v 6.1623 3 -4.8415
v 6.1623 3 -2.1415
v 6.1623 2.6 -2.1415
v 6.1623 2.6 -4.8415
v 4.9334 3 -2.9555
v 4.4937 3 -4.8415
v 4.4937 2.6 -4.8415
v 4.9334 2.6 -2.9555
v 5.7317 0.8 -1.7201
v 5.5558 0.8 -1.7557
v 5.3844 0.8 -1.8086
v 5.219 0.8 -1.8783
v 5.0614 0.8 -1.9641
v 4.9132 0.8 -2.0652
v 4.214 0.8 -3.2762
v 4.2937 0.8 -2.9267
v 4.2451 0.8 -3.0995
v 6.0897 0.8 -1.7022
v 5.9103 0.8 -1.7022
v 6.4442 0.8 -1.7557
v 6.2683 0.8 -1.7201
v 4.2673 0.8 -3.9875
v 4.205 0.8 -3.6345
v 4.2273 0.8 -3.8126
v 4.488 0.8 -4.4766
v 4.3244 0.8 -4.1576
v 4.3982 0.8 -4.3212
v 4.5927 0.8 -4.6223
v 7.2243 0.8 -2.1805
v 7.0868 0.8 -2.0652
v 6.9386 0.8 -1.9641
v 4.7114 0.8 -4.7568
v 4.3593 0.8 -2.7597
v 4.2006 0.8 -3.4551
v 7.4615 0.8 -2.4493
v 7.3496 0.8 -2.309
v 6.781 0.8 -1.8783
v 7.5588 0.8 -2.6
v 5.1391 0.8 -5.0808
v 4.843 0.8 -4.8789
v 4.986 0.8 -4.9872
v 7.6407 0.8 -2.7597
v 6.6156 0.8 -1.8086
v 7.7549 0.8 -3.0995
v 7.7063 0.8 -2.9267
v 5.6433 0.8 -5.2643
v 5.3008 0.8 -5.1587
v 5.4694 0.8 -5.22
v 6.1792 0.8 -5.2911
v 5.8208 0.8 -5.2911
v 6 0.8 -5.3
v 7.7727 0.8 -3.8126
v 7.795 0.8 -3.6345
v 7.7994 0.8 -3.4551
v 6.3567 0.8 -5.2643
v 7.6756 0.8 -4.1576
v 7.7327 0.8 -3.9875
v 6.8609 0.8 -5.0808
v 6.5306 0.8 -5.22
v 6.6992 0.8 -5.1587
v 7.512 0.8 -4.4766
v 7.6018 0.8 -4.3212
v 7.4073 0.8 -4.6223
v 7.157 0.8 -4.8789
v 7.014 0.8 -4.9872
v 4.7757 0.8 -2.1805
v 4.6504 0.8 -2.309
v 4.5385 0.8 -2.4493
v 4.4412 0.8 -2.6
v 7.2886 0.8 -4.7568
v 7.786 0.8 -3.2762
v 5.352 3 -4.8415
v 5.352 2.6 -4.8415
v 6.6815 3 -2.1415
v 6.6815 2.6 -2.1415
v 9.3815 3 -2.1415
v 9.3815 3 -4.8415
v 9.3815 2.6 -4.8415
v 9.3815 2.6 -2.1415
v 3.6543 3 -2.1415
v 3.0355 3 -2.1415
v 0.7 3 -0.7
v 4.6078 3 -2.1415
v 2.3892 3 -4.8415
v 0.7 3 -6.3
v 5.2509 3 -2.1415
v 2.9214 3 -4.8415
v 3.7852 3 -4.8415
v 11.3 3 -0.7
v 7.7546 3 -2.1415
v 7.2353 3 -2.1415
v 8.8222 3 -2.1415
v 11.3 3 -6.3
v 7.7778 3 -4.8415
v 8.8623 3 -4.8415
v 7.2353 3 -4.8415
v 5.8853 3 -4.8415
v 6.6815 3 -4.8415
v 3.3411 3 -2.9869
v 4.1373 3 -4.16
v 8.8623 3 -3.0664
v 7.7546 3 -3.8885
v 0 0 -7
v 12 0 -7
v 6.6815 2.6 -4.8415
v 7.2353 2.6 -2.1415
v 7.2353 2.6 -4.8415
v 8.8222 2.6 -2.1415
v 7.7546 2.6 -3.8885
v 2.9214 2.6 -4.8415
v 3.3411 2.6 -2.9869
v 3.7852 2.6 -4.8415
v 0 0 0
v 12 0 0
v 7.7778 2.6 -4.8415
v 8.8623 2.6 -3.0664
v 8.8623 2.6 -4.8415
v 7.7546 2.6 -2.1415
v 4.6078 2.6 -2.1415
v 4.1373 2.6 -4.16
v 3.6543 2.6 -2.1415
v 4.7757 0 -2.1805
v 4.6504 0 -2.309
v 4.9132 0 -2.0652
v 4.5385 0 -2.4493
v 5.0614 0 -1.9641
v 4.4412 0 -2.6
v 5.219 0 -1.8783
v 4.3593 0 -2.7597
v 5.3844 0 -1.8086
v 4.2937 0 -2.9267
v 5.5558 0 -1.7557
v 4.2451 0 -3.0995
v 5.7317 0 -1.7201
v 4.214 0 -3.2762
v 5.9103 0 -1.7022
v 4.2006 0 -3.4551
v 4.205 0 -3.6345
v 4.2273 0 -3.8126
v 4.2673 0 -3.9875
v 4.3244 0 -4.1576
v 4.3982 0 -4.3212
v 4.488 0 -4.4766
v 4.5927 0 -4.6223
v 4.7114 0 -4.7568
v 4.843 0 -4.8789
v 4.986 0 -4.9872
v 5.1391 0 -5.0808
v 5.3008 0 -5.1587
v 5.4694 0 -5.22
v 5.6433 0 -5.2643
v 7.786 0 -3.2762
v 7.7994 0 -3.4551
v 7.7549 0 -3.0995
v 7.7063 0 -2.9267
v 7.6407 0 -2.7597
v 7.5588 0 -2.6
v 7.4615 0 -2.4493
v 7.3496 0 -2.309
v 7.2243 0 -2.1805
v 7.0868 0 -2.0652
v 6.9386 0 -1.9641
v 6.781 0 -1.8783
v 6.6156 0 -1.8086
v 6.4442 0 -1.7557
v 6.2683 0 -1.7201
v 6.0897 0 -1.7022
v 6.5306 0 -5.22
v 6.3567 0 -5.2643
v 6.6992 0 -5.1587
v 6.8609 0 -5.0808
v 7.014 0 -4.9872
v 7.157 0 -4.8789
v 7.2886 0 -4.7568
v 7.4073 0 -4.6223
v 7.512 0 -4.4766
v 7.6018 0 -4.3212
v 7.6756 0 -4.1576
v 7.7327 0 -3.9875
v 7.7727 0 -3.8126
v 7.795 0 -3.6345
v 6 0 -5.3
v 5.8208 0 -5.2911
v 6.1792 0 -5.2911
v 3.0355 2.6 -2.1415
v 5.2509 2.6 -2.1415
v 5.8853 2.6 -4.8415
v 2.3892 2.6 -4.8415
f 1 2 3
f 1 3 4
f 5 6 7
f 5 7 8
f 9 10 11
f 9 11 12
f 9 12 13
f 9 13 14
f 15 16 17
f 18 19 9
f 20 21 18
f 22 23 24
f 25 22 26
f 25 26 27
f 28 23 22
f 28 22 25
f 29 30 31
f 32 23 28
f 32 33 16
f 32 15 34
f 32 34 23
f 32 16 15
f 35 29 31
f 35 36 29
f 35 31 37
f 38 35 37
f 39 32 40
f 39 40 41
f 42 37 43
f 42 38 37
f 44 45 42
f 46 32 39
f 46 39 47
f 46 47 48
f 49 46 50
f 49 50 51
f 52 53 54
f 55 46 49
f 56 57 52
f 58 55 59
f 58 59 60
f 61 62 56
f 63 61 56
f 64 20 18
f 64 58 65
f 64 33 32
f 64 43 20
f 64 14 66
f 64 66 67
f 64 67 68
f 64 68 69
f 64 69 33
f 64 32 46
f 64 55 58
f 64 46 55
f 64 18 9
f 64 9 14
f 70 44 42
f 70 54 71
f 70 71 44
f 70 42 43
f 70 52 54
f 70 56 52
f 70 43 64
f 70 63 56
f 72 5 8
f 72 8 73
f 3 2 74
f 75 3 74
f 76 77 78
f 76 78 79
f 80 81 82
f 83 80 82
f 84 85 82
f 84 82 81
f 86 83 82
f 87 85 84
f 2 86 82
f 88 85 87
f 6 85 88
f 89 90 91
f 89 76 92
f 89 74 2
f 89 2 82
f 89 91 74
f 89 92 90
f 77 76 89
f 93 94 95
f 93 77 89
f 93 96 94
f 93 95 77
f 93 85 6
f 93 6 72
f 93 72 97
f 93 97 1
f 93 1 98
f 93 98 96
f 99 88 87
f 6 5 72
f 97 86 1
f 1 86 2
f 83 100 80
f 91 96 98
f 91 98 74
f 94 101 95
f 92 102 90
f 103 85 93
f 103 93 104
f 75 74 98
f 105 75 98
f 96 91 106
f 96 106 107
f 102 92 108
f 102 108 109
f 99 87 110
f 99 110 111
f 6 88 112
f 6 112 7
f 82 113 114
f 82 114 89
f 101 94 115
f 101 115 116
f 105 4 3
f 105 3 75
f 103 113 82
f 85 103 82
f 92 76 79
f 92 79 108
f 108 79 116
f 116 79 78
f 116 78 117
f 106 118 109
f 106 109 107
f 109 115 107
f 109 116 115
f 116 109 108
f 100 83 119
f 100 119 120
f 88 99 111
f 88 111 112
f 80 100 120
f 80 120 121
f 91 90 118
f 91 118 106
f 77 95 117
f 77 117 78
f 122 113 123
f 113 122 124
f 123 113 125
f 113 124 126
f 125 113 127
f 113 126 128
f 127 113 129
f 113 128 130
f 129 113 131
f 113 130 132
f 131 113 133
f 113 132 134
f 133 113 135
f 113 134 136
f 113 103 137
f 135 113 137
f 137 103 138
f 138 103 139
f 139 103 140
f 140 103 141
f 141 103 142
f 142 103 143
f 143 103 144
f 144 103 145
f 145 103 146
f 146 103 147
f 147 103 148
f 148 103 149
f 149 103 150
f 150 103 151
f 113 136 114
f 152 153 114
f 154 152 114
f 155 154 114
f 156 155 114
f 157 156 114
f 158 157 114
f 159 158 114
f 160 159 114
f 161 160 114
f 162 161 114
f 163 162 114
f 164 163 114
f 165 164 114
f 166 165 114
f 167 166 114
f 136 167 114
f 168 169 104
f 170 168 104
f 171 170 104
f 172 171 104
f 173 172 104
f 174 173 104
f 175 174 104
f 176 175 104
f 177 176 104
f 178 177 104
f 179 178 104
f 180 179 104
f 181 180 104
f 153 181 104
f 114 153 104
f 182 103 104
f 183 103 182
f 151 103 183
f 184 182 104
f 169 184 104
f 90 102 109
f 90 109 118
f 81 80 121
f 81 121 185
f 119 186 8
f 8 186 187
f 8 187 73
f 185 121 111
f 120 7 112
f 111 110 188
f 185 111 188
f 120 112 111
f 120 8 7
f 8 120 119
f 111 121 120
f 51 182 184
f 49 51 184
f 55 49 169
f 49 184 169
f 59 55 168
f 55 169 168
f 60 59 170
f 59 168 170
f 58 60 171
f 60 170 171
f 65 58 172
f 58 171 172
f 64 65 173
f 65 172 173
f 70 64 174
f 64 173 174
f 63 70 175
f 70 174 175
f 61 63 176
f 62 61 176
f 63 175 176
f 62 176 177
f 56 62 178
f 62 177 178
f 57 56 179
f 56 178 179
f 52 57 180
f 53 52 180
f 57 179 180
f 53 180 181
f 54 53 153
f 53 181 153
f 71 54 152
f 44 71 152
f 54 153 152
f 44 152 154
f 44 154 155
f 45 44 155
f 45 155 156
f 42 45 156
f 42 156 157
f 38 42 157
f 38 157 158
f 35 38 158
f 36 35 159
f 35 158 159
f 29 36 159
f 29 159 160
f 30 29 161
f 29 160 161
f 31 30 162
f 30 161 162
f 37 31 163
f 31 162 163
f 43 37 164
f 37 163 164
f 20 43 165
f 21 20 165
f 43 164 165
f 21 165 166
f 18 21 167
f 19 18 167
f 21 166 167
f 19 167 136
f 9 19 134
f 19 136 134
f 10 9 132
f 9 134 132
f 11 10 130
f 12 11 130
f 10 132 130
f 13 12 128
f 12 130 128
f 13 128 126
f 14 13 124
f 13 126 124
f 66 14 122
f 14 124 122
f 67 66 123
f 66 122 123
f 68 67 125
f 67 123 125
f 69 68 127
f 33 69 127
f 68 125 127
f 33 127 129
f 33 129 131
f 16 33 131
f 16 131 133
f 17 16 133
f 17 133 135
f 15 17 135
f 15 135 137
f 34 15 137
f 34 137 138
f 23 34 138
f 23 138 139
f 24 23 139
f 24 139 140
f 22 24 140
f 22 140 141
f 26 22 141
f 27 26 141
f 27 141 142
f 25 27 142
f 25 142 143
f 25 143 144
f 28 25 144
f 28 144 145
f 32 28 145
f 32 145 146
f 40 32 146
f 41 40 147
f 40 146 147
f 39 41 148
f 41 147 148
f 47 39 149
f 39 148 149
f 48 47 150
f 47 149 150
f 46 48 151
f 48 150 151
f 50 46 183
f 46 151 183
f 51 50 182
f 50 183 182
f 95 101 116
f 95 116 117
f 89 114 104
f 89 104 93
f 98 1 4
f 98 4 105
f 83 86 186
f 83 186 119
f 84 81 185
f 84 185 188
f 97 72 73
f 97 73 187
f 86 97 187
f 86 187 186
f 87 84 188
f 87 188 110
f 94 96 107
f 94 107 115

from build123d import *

# Parameters (mm, degrees)
SKETCH1_W               = 12
SKETCH1_H               = 7
BOSS_EXTRUDE1_DEPTH     = 3
CUT_EXTRUDE1_DEPTH      = 7
CUT_EXTRUDE2_DEPTH      = 15.212670404
CUT_EXTRUDE2_DEPTH_BACK = 15.212670404
SKETCH4_R               = 1.8
CUT_EXTRUDE3_DEPTH      = 0.8
SKETCH5_W               = 0.519230769
SKETCH5_H               = 2.7
CUT_EXTRUDE4_DEPTH      = 0.4


with BuildPart() as part:
    # Sketch1 → Boss-Extrude1 (new body)
    with BuildSketch(Plane(origin=(0, 0, 0), x_dir=(1, 0, 0), z_dir=(0, 1, 0))):
        with Locations((6, 3.5)):
            Rectangle(SKETCH1_W, SKETCH1_H)
    extrude(amount=BOSS_EXTRUDE1_DEPTH)

    # Sketch2 → Cut-Extrude1 (cut)
    with BuildSketch(Plane.XY):
        Polygon((0, 0), (0.7, 3), (0, 3), align=None)
        Polygon((12, 0), (11.3, 3), (12, 3), align=None)
    extrude(amount=-CUT_EXTRUDE1_DEPTH, mode=Mode.SUBTRACT)

    # Sketch3 → Cut-Extrude2 (cut, two sides: drawn at the far end of the back side and taken through both)
    with BuildSketch(Plane(origin=(0, 0, 0), x_dir=(0, 0, -1), z_dir=(1, 0, 0)).offset(-CUT_EXTRUDE2_DEPTH_BACK)):
        Polygon((0, 0), (0.7, 3), (0, 3), align=None)
        Polygon((7, 3), (6.3, 3), (7, 0), align=None)
    extrude(amount=CUT_EXTRUDE2_DEPTH + CUT_EXTRUDE2_DEPTH_BACK, mode=Mode.SUBTRACT)

    # Sketch4 → Cut-Extrude3 (cut)
    with BuildSketch(Plane.XZ):
        with Locations(Location((6, -3.5, 0), (0, 0, 270))):
            Circle(SKETCH4_R)
    extrude(amount=-CUT_EXTRUDE3_DEPTH, mode=Mode.SUBTRACT)

    # Sketch5 → Cut-Extrude4 (cut)
    with BuildSketch(Plane(origin=(0, 3, 0), x_dir=(1, 0, 0), z_dir=(0, 1, 0))):
        Polygon((3.035523477, 2.141483951), (2.389189343, 4.841483951), (2.921400881, 4.841483951), (3.341112419, 2.986856547), (3.7851629, 4.841483951), (4.493696554, 4.841483951), (4.933420112, 2.955486355), (5.352049919, 4.841483951), (5.885343189, 4.841483951), (5.250908093, 2.141483951), (4.60781915, 2.141483951), (4.137266266, 4.159993566), (3.654273477, 2.141483951), align=None)
        with Locations((6.421881651, 3.491483951)):
            Rectangle(SKETCH5_W, SKETCH5_H)
        Polygon((7.235343189, 2.141483951), (7.235343189, 4.841483951), (7.777831169, 4.841483951), (8.862266266, 3.066363758), (8.862266266, 4.841483951), (9.381497035, 4.841483951), (9.381497035, 2.141483951), (8.822242227, 2.141483951), (7.754573958, 3.888479143), (7.754573958, 2.141483951), align=None)
    extrude(amount=-CUT_EXTRUDE4_DEPTH, mode=Mode.SUBTRACT)


solid = part.part
